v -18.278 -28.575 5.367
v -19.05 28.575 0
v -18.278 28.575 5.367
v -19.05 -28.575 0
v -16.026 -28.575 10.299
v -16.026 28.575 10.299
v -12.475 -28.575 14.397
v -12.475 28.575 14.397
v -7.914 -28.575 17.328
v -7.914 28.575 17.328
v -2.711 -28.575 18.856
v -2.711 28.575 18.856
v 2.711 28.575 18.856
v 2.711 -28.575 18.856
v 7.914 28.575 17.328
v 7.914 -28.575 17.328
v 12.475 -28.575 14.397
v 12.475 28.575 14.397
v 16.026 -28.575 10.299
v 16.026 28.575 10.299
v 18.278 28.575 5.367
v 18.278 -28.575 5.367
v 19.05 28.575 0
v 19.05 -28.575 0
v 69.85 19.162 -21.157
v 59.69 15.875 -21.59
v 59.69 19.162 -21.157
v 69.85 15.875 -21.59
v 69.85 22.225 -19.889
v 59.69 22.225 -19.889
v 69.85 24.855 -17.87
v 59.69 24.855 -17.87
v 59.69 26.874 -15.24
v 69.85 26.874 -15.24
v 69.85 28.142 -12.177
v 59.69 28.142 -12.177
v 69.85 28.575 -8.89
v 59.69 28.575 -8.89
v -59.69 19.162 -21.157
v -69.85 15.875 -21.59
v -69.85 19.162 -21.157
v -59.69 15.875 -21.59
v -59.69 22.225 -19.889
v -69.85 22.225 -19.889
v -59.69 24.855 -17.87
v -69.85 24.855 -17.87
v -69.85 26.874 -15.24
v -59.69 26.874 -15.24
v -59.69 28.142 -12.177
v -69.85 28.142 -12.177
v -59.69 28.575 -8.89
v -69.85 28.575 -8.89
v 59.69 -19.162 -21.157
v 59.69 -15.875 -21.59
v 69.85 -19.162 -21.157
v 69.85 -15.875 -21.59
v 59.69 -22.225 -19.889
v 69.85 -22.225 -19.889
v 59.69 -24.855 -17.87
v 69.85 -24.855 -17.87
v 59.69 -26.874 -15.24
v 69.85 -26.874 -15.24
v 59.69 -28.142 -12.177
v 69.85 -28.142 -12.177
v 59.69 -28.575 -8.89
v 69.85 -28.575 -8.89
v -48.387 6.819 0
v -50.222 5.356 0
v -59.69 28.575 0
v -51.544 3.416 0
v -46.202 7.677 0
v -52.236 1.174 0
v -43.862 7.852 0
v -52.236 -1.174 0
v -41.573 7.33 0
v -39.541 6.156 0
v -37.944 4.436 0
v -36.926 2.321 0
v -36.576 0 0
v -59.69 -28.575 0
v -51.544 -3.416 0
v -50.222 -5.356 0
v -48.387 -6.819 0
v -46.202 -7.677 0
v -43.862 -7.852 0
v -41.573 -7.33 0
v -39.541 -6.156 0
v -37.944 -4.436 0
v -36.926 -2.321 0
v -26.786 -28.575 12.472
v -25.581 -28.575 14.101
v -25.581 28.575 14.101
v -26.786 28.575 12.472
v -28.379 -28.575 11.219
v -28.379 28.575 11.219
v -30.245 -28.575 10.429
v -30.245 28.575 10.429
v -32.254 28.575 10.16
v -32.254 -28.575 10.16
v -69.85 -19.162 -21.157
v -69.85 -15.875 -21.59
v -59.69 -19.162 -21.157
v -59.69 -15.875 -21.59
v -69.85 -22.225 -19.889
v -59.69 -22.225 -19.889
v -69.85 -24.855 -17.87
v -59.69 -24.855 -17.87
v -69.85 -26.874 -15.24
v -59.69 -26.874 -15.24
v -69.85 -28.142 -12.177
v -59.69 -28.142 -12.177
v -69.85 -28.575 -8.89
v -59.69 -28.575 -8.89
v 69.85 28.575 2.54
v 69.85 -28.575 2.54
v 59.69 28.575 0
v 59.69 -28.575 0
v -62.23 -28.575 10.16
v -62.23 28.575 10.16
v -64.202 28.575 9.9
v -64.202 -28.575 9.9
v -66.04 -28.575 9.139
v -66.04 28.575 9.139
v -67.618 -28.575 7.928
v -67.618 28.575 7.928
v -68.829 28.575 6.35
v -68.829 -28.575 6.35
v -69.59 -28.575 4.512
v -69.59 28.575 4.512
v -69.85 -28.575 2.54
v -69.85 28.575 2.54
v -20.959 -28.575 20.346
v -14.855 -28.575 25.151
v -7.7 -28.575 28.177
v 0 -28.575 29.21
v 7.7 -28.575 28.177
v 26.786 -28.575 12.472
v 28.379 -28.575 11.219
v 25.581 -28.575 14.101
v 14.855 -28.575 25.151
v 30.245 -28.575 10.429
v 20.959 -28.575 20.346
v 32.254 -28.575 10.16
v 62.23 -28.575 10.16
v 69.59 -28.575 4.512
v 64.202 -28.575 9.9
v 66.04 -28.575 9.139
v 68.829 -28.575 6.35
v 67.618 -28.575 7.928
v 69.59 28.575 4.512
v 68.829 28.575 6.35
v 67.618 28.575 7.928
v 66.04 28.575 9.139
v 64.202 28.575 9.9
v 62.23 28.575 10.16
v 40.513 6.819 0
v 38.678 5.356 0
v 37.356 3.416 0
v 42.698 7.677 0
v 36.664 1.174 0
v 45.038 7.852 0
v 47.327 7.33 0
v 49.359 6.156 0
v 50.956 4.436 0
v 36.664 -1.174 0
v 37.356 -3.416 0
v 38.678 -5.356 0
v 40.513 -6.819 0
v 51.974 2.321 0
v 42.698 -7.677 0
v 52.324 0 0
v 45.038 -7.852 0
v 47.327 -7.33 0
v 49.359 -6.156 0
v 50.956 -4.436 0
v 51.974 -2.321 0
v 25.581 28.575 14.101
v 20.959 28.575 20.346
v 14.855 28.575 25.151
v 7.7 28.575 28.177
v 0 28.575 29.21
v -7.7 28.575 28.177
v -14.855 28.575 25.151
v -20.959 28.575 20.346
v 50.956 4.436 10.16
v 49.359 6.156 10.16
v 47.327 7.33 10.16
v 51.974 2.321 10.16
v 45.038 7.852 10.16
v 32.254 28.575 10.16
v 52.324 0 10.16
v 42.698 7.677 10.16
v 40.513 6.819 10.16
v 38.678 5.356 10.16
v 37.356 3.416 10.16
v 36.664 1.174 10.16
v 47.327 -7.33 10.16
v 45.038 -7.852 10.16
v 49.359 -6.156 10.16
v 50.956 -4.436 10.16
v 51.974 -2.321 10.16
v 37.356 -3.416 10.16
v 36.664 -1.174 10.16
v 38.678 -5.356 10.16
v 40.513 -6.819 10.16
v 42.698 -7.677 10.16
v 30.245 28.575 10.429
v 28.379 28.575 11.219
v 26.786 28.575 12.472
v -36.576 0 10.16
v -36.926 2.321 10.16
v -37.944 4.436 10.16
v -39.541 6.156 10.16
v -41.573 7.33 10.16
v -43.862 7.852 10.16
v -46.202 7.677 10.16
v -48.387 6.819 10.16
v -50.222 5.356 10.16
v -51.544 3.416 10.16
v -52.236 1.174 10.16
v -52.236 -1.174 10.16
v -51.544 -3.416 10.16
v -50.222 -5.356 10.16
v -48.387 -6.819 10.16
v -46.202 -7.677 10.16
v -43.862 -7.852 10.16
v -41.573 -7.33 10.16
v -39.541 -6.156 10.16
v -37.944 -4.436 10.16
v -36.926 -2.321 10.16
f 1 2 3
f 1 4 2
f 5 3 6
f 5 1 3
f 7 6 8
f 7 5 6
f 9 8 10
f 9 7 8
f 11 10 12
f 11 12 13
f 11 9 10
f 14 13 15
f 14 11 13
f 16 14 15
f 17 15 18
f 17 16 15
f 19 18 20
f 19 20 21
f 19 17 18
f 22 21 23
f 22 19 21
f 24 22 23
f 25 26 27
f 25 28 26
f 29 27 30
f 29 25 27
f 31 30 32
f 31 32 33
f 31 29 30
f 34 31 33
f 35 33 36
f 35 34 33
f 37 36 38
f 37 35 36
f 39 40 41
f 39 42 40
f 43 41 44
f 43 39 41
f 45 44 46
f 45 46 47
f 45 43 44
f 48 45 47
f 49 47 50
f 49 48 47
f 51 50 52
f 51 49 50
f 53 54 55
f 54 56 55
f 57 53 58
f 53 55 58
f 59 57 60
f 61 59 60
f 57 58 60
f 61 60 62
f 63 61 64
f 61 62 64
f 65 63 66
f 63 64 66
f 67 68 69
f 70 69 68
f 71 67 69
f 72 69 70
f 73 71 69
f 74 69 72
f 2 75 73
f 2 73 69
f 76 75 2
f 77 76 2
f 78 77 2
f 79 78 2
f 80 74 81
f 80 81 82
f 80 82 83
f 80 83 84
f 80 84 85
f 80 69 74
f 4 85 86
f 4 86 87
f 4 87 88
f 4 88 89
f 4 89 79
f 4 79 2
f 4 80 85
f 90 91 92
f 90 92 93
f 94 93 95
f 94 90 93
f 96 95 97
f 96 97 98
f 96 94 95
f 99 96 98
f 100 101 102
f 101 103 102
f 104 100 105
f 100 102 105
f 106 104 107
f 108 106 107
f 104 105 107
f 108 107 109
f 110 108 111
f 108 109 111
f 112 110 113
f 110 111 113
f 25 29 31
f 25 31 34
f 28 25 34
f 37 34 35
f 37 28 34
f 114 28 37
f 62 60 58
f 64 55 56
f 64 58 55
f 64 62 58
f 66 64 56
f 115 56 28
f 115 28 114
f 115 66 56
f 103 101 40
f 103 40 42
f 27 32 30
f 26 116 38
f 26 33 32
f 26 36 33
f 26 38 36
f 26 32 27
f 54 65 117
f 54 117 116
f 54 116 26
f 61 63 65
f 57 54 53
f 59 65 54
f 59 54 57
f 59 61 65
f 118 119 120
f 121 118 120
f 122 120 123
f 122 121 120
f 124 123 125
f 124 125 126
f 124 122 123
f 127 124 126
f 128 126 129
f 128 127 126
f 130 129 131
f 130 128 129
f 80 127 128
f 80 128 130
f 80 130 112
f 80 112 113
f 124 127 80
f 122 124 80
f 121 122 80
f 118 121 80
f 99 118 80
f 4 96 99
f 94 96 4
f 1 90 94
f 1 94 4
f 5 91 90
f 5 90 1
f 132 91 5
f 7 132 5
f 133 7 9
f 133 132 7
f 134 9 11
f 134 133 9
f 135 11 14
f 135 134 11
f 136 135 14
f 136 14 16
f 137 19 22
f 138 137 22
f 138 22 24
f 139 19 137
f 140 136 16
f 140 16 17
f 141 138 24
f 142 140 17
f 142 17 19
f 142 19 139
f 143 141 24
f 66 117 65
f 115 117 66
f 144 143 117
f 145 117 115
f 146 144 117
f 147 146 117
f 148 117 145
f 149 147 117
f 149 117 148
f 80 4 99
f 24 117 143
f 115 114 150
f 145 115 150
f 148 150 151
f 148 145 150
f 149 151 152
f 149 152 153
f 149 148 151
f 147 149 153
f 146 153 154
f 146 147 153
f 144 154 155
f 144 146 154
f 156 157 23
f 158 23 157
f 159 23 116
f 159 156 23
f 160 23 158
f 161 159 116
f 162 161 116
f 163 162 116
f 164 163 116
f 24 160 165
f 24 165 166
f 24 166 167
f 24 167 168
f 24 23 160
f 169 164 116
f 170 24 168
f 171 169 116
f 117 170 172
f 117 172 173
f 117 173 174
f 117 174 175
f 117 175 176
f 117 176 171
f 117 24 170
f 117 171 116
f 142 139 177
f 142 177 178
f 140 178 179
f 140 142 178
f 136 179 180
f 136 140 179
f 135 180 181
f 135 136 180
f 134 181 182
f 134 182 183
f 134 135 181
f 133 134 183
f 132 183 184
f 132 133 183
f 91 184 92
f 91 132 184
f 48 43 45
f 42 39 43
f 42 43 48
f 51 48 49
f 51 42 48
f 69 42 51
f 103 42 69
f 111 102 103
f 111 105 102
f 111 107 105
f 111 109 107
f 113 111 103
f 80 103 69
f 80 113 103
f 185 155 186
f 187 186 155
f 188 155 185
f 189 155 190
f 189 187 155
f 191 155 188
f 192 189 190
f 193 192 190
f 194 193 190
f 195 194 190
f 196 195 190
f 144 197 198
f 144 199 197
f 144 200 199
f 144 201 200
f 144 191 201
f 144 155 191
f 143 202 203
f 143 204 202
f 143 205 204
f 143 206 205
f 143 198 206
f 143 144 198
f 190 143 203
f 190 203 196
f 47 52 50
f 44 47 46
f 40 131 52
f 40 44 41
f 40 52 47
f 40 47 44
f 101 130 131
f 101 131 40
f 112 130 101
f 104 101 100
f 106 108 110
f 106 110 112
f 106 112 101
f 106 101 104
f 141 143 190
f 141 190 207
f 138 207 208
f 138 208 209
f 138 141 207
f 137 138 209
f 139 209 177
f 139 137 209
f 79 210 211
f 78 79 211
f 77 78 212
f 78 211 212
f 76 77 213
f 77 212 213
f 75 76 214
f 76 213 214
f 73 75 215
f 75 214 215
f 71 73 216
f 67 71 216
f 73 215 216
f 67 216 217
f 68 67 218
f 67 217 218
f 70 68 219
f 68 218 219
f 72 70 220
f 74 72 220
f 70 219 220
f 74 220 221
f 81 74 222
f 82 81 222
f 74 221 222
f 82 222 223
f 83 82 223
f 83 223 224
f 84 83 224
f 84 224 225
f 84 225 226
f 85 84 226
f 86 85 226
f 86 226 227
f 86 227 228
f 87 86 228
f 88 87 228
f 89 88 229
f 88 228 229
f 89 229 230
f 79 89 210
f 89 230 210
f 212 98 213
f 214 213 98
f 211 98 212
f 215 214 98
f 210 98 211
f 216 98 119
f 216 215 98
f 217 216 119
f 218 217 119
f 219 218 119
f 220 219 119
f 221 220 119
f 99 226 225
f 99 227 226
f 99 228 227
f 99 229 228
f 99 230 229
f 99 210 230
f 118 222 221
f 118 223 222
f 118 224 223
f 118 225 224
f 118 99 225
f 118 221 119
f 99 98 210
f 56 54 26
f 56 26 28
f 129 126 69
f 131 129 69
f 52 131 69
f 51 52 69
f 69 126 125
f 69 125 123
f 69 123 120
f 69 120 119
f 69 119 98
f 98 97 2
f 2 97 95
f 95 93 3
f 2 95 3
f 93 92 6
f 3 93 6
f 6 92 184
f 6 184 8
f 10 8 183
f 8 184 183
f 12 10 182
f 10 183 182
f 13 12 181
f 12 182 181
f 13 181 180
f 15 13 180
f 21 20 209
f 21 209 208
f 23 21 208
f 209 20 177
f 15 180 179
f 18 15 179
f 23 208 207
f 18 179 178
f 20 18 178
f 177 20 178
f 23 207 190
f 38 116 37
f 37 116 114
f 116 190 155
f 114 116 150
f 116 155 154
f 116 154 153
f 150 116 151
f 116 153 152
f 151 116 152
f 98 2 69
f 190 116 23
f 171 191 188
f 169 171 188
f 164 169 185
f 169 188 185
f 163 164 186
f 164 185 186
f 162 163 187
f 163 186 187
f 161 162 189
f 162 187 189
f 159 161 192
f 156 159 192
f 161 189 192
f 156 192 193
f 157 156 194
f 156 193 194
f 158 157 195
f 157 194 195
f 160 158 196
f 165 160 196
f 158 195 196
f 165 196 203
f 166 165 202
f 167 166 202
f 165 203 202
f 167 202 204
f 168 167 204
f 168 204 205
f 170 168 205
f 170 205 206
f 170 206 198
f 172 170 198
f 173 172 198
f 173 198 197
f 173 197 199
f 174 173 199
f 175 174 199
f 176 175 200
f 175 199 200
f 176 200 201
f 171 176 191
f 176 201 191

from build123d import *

# Parameters (mm, degrees)
F1_DEPTH = 28.575
F2_R     = 12.7
F3_R     = 7.874
F4_DEPTH = 10.16


with BuildPart() as f1:
    # F0 (on Front) → F1 (new body, symmetric)
    with BuildSketch(Plane.XZ):
        with BuildLine():
            ThreePointArc((-19.05, 0), (0, 19.05), (19.05, 0))
            Line((19.05, 0), (59.69, 0))
            Line((59.69, 0), (59.69, -21.59))
            Line((59.69, -21.59), (69.85, -21.59))
            Line((69.85, -21.59), (69.85, 2.54))
            ThreePointArc((69.85, 2.54), (67.618154, 7.928154), (62.23, 10.16))
            Line((62.23, 10.16), (32.254, 10.16))
            ThreePointArc((32.254, 10.16), (28.378867, 11.218922), (25.580758, 14.101379))
            ThreePointArc((25.580758, 14.101379), (0, 29.21), (-25.580758, 14.101379))
            ThreePointArc((-25.580758, 14.101379), (-28.378867, 11.218922), (-32.254, 10.16))
            Line((-32.254, 10.16), (-62.23, 10.16))
            ThreePointArc((-62.23, 10.16), (-67.618154, 7.928154), (-69.85, 2.54))
            Line((-69.85, 2.54), (-69.85, -21.59))
            Line((-69.85, -21.59), (-59.69, -21.59))
            Line((-59.69, -21.59), (-59.69, 0))
            Line((-59.69, 0), (-19.05, 0))
        make_face()
    extrude(amount=F1_DEPTH, both=True)

    # F2
    f2_edges = [f1.edges().sort_by_distance(p)[0] for p in [
        (64.77, -28.575, -21.59),
        (-64.77, -28.575, -21.59),
        (64.77, 28.575, -21.59),
        (-64.77, 28.575, -21.59),
    ]]
    fillet(f2_edges, radius=F2_R)

    # F3 (on face) → F4 (cut)
    with BuildSketch(Plane.XY.offset(10.16)):
        with Locations((-44.45, 0)):
            Circle(F3_R)
        with Locations((44.45, 0)):
            Circle(F3_R)
    extrude(amount=-F4_DEPTH, mode=Mode.SUBTRACT)


solid = f1.part
